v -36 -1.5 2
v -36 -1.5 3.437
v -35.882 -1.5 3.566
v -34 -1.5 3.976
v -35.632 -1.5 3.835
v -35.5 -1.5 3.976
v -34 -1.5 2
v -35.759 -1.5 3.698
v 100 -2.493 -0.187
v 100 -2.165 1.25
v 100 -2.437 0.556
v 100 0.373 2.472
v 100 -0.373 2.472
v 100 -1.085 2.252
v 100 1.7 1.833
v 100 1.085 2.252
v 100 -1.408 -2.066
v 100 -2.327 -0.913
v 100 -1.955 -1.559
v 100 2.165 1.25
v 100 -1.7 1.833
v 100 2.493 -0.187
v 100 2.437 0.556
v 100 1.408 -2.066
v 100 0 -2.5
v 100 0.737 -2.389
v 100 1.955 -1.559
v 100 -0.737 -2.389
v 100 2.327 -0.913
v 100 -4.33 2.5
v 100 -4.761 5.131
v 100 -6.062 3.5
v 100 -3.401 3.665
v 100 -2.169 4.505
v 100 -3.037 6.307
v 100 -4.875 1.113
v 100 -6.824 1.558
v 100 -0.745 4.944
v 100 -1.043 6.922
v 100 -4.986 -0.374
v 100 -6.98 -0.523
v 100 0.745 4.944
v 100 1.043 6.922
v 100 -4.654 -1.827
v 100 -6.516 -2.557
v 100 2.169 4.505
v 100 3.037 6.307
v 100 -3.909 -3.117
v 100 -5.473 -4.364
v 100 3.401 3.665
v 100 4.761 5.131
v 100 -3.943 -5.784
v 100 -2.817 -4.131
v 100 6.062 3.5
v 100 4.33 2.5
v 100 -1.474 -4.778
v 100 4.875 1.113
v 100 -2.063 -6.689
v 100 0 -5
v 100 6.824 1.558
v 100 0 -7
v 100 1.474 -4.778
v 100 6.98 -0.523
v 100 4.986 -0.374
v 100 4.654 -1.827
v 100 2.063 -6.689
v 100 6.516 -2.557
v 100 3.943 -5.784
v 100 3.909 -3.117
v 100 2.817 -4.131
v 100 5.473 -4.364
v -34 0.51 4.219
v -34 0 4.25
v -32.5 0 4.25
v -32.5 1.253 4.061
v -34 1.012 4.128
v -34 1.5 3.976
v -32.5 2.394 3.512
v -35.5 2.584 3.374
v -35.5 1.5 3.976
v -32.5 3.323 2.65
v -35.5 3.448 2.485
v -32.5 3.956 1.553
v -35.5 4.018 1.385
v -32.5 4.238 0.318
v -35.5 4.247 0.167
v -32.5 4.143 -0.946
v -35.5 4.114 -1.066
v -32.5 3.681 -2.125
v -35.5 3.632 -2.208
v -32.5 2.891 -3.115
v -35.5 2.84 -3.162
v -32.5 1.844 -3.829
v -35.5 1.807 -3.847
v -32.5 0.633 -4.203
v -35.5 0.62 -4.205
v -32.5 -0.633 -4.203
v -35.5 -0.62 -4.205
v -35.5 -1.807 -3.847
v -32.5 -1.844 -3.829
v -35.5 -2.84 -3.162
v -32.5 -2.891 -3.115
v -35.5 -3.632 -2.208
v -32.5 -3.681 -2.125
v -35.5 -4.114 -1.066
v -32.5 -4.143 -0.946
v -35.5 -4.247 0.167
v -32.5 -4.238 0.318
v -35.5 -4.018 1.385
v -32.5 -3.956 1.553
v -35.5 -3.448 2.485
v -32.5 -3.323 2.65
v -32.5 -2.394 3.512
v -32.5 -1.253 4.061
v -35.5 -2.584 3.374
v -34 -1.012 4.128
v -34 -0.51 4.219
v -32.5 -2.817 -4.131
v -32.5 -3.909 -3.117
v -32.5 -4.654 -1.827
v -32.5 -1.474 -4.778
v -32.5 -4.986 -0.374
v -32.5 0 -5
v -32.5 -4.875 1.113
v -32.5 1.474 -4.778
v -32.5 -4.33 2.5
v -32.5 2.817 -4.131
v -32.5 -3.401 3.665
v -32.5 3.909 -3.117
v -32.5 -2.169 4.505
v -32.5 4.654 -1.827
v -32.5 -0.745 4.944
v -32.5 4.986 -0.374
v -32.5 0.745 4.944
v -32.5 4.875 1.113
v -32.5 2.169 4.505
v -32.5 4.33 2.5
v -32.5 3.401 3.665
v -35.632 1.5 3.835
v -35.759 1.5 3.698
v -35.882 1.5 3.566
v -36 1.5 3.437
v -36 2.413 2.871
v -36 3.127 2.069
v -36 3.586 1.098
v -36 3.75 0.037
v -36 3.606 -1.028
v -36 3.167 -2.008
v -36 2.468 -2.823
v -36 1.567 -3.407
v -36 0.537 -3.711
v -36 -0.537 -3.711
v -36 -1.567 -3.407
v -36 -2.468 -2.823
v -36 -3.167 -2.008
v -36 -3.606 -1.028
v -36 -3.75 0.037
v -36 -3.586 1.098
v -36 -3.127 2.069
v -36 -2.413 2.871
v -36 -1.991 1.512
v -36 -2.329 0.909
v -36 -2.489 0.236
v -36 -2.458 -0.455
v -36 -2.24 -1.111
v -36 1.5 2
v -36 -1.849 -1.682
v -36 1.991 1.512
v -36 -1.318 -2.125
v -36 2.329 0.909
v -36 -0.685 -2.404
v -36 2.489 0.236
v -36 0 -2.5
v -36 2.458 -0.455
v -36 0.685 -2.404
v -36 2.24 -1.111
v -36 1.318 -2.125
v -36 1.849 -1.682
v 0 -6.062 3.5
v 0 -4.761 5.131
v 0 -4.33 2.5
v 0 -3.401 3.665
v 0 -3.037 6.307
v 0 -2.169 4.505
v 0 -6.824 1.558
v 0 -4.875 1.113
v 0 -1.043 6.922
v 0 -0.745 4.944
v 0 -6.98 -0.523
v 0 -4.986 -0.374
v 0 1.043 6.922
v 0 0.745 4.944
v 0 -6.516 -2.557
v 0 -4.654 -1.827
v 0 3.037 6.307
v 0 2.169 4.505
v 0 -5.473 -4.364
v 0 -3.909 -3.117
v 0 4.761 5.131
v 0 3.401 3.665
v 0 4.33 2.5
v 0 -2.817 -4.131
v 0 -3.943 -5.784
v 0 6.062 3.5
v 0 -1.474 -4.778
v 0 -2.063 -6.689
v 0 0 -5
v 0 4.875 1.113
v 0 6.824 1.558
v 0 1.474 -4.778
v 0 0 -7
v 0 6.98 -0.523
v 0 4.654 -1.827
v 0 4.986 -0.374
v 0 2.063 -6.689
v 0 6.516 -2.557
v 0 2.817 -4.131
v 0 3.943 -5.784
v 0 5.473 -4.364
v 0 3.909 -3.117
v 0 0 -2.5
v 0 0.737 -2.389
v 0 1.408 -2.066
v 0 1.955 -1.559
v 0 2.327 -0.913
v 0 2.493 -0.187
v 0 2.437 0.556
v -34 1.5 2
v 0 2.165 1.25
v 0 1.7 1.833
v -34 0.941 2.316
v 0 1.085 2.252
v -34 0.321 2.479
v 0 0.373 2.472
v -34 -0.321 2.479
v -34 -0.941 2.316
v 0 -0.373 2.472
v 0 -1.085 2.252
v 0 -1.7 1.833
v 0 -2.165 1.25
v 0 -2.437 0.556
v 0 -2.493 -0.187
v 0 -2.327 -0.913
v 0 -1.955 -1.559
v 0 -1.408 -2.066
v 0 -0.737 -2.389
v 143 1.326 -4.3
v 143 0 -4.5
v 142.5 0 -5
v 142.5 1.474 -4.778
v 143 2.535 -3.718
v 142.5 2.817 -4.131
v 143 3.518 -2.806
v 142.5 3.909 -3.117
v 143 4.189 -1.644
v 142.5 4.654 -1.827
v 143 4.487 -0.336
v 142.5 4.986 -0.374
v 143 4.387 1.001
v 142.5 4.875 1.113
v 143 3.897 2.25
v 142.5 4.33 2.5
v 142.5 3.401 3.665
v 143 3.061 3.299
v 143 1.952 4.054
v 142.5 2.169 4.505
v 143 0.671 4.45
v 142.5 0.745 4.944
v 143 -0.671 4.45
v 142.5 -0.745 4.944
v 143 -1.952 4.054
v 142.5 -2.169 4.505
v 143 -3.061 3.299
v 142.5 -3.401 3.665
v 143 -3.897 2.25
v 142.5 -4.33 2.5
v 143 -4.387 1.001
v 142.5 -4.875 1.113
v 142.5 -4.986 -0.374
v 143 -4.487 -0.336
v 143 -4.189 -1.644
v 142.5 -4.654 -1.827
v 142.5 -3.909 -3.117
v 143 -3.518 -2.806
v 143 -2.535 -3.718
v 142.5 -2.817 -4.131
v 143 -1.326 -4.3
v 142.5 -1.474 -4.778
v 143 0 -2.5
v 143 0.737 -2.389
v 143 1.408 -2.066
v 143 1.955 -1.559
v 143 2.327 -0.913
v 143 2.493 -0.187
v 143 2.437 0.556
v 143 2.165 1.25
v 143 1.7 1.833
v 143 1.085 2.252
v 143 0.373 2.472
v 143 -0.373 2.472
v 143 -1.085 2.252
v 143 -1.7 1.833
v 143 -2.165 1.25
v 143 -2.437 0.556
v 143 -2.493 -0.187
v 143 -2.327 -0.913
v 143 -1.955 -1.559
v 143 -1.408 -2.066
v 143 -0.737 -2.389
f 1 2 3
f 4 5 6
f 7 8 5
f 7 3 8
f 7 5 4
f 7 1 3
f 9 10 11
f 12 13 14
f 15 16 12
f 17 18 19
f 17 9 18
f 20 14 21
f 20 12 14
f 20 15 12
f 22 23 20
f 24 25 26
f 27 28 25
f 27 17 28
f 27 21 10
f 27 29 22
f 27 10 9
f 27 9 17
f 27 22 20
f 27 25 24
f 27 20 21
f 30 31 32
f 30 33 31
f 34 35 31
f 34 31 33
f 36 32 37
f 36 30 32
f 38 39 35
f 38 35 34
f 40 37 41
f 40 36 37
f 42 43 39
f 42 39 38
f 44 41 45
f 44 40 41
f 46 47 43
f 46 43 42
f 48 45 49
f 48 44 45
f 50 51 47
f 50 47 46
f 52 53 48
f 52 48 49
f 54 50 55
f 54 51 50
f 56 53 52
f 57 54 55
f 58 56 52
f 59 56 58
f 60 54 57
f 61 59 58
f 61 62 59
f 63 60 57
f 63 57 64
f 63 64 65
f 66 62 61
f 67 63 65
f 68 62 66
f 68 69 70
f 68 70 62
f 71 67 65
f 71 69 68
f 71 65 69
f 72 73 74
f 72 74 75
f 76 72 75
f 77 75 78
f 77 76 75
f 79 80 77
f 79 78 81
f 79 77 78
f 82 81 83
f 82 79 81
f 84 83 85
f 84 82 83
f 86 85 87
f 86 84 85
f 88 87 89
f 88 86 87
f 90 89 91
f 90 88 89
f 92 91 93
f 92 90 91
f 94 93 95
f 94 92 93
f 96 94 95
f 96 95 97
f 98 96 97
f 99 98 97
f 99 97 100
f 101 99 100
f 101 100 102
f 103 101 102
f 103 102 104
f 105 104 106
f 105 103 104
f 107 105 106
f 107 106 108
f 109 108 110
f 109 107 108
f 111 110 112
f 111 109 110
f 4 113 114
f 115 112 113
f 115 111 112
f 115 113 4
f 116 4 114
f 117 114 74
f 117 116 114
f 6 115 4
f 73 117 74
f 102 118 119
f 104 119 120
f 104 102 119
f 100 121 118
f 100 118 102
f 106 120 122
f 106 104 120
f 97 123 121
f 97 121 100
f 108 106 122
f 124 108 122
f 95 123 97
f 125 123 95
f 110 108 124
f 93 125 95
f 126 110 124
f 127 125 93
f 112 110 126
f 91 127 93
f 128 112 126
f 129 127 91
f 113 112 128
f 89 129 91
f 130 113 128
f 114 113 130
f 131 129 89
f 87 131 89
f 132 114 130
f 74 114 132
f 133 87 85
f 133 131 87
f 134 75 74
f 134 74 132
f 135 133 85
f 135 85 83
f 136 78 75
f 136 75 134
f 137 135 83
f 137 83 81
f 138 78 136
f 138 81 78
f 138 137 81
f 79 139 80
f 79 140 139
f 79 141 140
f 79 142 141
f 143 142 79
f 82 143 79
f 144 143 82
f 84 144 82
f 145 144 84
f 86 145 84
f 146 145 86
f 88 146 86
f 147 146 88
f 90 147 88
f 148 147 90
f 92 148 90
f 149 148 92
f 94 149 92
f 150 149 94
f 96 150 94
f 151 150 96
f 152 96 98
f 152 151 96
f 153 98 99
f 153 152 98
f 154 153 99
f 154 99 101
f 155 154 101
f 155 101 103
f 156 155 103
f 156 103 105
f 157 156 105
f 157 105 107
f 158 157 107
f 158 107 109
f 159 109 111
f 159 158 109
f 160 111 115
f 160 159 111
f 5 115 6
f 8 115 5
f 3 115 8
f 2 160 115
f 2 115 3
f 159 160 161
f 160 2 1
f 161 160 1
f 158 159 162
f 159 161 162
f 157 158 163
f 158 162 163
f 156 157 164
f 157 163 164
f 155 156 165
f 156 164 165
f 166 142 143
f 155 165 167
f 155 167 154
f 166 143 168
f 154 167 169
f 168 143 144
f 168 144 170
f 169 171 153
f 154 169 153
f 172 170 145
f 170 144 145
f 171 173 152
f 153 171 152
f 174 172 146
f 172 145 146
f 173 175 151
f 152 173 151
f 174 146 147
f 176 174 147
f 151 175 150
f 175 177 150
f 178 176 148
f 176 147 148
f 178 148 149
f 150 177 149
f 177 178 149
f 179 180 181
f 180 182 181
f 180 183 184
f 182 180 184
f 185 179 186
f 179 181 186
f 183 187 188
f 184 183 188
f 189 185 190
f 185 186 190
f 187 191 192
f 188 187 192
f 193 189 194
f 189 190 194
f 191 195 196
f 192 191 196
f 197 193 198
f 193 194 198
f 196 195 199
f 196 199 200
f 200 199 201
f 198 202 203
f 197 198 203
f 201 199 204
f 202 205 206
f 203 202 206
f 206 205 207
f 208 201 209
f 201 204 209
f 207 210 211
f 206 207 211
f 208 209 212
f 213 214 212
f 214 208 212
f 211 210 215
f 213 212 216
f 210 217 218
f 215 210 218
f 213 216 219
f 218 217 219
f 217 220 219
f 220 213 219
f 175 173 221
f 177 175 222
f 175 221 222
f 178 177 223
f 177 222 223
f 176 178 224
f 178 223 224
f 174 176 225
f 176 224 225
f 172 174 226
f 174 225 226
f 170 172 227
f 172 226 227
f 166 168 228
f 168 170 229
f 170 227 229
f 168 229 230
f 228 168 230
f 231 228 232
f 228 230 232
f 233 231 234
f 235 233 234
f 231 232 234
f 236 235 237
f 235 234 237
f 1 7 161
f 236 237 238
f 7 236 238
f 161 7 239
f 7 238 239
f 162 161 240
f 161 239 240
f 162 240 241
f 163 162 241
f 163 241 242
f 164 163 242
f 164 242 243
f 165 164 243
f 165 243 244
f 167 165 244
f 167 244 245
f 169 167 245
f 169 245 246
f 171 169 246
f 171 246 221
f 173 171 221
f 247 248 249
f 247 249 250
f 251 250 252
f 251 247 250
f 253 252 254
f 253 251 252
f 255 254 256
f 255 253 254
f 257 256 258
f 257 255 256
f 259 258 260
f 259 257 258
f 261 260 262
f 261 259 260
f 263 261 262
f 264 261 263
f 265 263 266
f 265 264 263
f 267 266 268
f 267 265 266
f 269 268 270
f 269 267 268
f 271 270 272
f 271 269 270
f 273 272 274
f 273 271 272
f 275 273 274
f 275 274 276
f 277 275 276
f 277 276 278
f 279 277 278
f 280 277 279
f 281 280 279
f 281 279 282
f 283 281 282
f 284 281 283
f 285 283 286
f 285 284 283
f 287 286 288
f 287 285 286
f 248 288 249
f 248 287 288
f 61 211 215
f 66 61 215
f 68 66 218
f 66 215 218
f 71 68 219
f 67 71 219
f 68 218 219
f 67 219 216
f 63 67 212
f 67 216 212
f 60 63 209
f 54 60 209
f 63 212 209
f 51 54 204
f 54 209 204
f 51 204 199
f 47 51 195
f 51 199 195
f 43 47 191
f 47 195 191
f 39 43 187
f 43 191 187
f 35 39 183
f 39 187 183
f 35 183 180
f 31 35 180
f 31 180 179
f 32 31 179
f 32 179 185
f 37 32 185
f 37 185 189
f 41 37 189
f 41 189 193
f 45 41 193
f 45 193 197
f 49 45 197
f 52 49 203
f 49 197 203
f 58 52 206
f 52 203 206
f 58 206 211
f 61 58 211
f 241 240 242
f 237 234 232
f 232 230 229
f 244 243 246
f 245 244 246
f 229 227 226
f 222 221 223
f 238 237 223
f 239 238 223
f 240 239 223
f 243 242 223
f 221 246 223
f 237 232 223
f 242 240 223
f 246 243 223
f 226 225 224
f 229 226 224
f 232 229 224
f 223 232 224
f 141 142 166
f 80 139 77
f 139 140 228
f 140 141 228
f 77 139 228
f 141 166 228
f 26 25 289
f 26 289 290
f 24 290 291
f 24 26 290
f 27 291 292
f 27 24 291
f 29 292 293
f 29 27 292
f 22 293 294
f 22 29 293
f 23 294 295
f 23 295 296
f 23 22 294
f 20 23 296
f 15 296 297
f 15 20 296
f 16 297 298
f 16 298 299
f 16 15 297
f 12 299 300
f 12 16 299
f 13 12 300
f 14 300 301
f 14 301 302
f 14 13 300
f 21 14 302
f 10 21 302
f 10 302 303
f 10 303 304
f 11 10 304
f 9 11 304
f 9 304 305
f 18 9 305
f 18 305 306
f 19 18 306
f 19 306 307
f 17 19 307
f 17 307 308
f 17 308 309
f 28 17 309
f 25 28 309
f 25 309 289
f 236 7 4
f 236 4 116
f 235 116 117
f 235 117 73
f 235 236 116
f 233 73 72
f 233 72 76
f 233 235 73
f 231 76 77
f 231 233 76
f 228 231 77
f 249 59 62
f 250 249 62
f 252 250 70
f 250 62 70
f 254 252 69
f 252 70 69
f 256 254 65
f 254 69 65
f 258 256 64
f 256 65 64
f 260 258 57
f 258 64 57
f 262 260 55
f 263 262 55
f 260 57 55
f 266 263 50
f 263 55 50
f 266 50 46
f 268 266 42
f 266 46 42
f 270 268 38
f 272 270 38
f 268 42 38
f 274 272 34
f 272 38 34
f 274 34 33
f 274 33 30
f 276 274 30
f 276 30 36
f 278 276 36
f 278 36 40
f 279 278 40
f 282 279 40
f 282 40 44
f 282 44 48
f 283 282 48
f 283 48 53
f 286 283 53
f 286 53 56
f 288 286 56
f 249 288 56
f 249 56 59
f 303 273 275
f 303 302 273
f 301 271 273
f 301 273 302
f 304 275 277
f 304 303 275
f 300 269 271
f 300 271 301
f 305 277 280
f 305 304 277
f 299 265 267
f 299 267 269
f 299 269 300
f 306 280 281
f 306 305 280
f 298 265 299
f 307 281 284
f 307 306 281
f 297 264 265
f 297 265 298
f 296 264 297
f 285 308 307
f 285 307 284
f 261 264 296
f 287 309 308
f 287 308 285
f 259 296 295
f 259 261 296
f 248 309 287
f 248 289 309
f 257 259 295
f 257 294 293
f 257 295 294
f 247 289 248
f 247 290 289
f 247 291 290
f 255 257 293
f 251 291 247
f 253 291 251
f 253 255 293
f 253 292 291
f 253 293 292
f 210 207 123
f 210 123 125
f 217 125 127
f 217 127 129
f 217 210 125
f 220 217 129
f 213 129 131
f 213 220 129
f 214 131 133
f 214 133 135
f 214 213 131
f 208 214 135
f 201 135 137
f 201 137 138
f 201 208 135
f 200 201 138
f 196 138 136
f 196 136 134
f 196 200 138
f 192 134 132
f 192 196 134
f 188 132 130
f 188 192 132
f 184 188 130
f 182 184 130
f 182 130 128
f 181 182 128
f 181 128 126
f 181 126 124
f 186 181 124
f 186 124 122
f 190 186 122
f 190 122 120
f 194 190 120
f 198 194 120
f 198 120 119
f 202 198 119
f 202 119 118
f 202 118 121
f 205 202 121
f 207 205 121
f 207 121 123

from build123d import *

# Parameters (mm, degrees)
ESQUISSE1_R             = 7
EXTRUSION1_DEPTH        = 100
ESQUISSE2_R             = 5
ESQUISSE2_R_2           = 2.5
EXTRUSION2_DEPTH        = 143
EXTRUSION2_DEPTH_BACK   = 36
ESQUISSE3_OUTSIDE_W     = 52.018
ESQUISSE3_OUTSIDE_H     = 52.018
ESQUISSE3_OUTSIDE_R     = 4.25
ENL_V_MAT_EXTRU_1_DEPTH = 3.5
ESQUISSE4_W             = 2
ESQUISSE4_H             = 3
ENL_V_MAT_EXTRU_2_DEPTH = 8
CHANFREIN1_SIZE         = 0.5


with BuildPart() as part:
    # Esquisse1 → Extrusion1 (new body)
    with BuildSketch(Plane(origin=(0, 0, 0), x_dir=(0, 0, -1), z_dir=(1, 0, 0))):
        Circle(ESQUISSE1_R)
    extrude(amount=EXTRUSION1_DEPTH)

    # Esquisse2 → Extrusion2 (add, two sides)
    with BuildSketch(Plane(origin=(0, 0, 0), x_dir=(0, 0, -1), z_dir=(1, 0, 0))) as extrusion2_sk:
        Circle(ESQUISSE2_R)
        Circle(ESQUISSE2_R_2, mode=Mode.SUBTRACT)
    extrude(amount=EXTRUSION2_DEPTH)
    extrude(extrusion2_sk.sketch, amount=-EXTRUSION2_DEPTH_BACK)

    # Esquisse3 outside → Enlèv. mat.-Extru.1 (cut)
    with BuildSketch(Plane.ZY.offset(36)):
        Rectangle(ESQUISSE3_OUTSIDE_W, ESQUISSE3_OUTSIDE_H)
        Circle(ESQUISSE3_OUTSIDE_R, mode=Mode.SUBTRACT)
    extrude(amount=-ENL_V_MAT_EXTRU_1_DEPTH, mode=Mode.SUBTRACT)

    # Esquisse4 → Enlèv. mat.-Extru.2 (cut, through all)
    with BuildSketch(Plane.XY):
        with Locations((-35, 0)):
            Rectangle(ESQUISSE4_W, ESQUISSE4_H)
    extrude(amount=ENL_V_MAT_EXTRU_2_DEPTH, mode=Mode.SUBTRACT)

    # Chanfrein1
    chanfrein1_edges = [part.edges().sort_by_distance(p)[0] for p in [
        (-36, 0, -4.25),
        (143, 0, 5),
    ]]
    chamfer(chanfrein1_edges, length=CHANFREIN1_SIZE)


solid = part.part
